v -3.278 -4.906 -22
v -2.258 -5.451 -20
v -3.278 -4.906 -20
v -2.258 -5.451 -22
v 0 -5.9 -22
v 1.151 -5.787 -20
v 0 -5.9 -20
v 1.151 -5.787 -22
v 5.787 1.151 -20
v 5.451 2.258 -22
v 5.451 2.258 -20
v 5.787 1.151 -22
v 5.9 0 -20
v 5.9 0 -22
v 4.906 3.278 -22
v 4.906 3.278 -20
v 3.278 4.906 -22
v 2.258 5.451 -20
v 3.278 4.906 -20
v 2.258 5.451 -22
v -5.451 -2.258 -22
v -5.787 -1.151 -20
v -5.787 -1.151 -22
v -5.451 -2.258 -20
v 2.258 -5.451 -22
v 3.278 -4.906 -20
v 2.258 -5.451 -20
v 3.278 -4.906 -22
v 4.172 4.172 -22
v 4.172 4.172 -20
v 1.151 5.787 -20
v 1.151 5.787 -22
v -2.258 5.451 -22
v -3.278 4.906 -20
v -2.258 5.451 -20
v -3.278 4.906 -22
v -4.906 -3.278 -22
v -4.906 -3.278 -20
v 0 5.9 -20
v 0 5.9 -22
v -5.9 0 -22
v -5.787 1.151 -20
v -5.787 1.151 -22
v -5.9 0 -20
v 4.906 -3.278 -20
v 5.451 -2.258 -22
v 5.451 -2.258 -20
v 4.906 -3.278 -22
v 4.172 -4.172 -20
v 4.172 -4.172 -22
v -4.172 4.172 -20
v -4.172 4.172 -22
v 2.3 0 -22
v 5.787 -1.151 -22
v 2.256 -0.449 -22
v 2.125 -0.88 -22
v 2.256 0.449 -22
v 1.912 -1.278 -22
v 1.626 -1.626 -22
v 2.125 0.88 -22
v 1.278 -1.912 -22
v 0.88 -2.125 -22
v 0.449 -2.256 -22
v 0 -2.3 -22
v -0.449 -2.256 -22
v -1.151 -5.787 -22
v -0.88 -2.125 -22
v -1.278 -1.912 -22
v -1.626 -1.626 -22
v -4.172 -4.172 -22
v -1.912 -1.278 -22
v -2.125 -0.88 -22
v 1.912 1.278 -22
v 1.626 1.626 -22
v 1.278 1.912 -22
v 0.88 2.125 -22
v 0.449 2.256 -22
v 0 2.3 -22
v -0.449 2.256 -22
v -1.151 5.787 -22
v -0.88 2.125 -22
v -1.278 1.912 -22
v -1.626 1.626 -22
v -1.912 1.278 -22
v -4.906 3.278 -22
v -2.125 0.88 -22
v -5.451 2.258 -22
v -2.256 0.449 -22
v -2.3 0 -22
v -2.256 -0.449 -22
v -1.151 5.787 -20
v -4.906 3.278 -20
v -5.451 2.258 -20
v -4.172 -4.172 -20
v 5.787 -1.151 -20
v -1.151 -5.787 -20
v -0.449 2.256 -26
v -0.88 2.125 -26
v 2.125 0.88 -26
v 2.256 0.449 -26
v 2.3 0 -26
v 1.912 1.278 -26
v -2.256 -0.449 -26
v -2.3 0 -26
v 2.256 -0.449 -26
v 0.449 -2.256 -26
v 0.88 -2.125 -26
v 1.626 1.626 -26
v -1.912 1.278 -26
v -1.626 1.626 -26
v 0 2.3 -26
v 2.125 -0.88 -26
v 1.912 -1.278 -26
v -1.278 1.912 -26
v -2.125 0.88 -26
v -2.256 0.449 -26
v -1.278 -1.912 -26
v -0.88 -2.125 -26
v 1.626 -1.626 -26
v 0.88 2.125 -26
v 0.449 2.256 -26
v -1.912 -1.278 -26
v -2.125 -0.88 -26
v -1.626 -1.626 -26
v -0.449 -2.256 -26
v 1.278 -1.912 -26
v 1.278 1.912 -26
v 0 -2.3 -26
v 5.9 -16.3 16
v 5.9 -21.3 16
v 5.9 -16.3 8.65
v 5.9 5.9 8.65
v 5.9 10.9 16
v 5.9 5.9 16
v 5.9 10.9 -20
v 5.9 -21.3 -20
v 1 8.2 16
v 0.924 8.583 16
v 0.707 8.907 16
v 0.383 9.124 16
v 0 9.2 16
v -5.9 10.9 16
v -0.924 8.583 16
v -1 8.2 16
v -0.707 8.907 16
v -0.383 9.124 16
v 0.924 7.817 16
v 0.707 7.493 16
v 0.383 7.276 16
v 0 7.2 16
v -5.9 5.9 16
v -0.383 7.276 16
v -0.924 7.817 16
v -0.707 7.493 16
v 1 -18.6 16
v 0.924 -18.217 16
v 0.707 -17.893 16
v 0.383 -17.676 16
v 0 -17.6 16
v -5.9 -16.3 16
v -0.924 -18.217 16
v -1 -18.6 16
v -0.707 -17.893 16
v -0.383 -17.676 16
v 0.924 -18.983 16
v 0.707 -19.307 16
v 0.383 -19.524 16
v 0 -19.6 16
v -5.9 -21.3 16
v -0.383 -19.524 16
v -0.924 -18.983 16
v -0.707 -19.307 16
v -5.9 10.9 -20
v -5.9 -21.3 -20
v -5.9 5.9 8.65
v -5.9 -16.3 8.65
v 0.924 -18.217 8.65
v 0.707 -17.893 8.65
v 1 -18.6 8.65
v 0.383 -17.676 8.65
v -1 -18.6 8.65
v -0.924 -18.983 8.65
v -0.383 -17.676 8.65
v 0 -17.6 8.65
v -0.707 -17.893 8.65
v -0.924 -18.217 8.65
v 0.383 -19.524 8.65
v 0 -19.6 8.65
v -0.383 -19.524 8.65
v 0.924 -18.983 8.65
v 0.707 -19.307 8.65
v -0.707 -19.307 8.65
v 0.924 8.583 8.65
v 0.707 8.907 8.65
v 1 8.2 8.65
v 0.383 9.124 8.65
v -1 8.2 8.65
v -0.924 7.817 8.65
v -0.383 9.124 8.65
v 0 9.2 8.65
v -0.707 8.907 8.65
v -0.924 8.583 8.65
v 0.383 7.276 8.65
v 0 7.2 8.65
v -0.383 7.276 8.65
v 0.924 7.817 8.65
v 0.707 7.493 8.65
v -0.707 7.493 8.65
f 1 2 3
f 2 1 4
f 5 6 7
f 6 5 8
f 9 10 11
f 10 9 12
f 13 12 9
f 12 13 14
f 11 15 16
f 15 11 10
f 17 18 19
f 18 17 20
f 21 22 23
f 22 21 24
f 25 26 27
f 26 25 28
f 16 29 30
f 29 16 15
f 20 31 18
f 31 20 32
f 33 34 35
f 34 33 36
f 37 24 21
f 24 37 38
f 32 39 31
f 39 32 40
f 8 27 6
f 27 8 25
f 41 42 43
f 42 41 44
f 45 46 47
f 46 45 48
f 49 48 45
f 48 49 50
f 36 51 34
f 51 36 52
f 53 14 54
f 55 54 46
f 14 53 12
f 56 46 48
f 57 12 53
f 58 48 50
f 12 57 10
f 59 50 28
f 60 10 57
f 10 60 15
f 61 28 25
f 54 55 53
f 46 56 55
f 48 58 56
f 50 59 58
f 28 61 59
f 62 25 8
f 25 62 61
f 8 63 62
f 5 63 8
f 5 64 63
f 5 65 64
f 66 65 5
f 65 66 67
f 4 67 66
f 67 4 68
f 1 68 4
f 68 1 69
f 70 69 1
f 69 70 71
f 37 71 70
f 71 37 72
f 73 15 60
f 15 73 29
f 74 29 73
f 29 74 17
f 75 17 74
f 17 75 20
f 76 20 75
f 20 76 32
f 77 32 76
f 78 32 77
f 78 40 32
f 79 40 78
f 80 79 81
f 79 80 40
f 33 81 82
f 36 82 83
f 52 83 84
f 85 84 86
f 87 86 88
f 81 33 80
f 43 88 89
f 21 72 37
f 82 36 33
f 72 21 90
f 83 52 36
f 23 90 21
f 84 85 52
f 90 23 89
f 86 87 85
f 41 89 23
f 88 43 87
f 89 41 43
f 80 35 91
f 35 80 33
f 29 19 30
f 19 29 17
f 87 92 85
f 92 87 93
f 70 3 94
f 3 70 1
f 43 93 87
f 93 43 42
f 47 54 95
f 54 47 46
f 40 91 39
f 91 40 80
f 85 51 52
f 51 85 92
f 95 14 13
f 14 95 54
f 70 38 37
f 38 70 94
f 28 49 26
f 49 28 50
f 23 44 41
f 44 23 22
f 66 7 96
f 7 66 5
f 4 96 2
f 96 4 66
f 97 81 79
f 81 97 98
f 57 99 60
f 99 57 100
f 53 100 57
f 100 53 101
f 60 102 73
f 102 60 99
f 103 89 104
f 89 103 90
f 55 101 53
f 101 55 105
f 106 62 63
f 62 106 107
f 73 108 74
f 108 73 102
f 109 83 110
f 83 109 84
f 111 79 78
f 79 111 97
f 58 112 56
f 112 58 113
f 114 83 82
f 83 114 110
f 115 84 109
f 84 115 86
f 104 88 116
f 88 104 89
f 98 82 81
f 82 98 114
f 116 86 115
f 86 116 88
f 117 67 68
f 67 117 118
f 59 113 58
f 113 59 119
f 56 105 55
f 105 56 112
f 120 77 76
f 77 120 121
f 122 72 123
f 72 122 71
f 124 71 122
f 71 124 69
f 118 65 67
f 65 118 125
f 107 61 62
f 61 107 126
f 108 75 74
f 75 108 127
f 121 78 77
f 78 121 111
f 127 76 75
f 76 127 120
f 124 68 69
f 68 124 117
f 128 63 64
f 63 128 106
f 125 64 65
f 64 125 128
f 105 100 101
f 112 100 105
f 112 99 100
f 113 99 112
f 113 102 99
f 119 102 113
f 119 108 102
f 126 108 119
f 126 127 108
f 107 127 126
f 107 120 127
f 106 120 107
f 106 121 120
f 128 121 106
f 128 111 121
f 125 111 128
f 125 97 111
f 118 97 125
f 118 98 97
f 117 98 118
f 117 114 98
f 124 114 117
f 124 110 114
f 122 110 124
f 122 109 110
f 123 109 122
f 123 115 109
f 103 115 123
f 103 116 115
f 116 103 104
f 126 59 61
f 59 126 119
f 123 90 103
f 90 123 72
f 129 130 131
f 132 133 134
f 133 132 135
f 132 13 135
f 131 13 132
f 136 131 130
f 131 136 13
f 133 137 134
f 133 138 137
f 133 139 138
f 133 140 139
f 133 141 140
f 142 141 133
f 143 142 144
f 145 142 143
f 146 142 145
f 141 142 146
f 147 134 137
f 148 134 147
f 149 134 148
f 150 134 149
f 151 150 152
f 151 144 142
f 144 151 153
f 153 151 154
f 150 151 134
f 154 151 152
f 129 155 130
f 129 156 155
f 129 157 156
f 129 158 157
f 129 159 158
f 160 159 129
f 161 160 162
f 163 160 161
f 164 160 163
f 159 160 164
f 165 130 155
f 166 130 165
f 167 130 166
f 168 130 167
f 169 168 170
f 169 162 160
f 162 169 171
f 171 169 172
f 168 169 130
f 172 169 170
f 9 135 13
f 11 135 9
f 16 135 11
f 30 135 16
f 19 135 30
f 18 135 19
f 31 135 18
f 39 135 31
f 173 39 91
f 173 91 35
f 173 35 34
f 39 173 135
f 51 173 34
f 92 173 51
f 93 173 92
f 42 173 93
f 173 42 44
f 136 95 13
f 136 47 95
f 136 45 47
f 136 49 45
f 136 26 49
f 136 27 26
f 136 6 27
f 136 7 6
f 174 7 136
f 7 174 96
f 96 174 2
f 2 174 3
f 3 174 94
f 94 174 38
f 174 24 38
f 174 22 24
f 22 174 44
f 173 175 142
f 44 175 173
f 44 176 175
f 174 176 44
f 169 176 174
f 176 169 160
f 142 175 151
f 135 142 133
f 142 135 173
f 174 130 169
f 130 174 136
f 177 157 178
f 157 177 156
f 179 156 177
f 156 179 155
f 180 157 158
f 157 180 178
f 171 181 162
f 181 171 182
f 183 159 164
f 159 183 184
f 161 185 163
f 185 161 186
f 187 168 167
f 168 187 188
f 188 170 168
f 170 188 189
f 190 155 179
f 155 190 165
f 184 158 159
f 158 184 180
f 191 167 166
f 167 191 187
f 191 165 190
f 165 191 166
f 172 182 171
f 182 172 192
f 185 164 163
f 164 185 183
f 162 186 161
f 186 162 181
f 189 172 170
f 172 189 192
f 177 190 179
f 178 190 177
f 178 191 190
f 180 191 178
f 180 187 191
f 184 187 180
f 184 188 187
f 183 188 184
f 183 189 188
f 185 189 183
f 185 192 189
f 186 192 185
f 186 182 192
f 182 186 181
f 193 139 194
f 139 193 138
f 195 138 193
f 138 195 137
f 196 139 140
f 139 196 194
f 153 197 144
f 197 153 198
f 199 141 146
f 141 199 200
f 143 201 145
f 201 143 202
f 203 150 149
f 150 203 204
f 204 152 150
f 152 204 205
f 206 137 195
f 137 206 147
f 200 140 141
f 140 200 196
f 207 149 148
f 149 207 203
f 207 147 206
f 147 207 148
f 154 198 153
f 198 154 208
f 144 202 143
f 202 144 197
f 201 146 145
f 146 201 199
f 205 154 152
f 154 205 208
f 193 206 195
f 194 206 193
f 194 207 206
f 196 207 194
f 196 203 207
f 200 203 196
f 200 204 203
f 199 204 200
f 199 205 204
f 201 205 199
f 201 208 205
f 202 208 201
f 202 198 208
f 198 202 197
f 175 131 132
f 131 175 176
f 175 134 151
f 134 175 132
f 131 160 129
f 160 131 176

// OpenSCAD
// file: ../envelopes/servo-envelope.scad
// Enveloppe for servo holes fixations
// Around the servo motor and the fixation holes

module servoEnvelope(
    servo_hole_scale = 1,
    screw_hole_diameter = 2
) {

    servo_length = 22.2;
    servo_width = 11.8;
    servo_height = 22.7;

    // translating to center the servo motor envelope as servo
    scale(servo_hole_scale)
        translate([-servo_width / 2, - servo_length + (servo_width / 2), -servo_height/2])
            cube([servo_width, servo_length, servo_height], center = false);    

    
    translate([-servo_width / 2, - servo_length + (servo_width / 2), -servo_height/2]) {
        translate([servo_width / 2, - 2.3, 0])
            cylinder(h = servo_height, r = 1, center = false, $fn = 16);

        translate([servo_width / 2, servo_length + 2.3, 0])
            cylinder(h = servo_height, r = 1, center = false, $fn = 16);
    }
}
// main file
use <../envelopes/servo-envelope.scad>

hipPieceA();


module hipPieceA(){

    difference() {
        union() {
            translate([-11.8 / 2, - 22.2 + (11.8 / 2) - 5, -20])
                cube([11.8, 32.2, 36]);

            union() {
                translate([0, 0, -22]) {
                    cylinder(r= 11.8 / 2, h = 3, $fn = 32);
                    translate([0, 0, -4])
                        cylinder(r= 4.6 / 2, h = 4, $fn = 32);
                }
            }
        }

        translate([0, 0, 20])
            servoEnvelope();
    }
}
